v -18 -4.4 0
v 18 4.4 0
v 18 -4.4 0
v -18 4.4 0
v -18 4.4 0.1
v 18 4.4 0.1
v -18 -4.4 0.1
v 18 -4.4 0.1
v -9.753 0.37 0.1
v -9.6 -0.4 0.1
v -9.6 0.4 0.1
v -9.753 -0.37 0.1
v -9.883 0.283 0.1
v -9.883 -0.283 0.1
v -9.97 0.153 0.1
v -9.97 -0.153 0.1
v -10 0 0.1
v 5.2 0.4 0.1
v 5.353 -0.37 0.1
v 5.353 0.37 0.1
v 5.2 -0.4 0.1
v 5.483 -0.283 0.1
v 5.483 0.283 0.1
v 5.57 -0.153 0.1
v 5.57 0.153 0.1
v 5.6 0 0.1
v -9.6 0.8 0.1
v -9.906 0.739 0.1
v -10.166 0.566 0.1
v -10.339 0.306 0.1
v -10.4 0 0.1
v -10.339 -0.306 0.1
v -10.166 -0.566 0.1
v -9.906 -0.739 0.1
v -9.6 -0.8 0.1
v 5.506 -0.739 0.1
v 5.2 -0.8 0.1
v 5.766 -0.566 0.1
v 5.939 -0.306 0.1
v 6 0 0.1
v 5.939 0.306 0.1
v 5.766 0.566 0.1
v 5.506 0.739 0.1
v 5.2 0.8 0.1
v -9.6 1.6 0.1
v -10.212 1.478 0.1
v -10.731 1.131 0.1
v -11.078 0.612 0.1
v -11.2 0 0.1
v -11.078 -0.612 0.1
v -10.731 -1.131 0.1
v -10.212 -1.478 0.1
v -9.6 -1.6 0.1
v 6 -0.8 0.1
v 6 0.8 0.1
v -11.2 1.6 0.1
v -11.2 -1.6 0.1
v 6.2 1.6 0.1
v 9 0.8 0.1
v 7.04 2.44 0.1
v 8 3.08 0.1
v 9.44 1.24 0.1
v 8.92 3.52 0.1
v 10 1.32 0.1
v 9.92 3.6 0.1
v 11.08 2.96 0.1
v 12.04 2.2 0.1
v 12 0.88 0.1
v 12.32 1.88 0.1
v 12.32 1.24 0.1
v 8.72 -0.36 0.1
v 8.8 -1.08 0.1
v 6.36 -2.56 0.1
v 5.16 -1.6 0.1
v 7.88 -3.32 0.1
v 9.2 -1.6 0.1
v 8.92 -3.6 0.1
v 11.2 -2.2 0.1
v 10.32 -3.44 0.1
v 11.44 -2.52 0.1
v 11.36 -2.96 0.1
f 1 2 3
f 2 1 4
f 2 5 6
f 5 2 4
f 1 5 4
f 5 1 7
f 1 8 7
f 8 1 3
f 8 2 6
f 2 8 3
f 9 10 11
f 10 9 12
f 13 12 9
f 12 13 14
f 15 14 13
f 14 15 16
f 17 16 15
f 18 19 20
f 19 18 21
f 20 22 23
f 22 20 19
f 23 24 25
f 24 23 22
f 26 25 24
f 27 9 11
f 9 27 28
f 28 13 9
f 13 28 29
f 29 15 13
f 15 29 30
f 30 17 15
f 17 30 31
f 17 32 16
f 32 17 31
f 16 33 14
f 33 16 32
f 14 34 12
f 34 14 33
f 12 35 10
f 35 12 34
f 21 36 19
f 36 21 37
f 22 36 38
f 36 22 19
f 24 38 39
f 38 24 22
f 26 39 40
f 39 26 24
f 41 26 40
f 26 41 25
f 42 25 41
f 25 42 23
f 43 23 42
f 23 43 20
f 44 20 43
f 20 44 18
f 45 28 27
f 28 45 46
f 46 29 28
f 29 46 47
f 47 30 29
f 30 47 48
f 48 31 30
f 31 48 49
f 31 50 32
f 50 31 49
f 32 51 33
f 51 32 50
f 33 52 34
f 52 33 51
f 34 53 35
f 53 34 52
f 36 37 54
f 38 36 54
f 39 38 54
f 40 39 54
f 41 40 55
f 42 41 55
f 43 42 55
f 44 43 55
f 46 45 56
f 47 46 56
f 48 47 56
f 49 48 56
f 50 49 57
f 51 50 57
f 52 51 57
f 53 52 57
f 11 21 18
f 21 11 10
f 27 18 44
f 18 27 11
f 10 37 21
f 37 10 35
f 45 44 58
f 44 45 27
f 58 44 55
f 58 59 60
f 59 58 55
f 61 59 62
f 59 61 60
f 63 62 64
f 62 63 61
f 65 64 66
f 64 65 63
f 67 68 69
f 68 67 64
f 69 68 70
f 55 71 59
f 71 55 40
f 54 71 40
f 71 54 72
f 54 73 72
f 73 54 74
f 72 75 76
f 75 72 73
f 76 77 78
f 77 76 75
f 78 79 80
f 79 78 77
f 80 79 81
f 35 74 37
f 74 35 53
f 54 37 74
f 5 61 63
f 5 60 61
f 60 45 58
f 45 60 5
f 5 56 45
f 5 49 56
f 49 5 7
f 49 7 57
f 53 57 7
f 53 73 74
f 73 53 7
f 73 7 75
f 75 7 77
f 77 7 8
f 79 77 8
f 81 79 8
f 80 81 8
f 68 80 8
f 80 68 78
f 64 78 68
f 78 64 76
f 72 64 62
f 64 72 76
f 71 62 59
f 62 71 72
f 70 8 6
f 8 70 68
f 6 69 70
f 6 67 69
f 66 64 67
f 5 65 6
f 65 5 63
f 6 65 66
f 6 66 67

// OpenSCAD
// file: ../p/4-4edge.scad
use <../lib.scad>
$fa=1; $fs=0.2;
function ldraw_lib__4_4edge(realsolid=false) = [
// 0 Circle 1.0
// 0 Name: 4-4edge.dat
// 0 Author: James Jessiman
// 0 !LDRAW_ORG Primitive UPDATE 2017-01
// 0 !LICENSE Licensed under CC BY 2.0 and CC BY 4.0 : see CAreadme.txt
// 
// 0 BFC CERTIFY CCW
  [0,"BFC","CERTIFY"],
  [0,"BFC","CCW"],
// 
// 0 !HISTORY 1998-12-15 [PTadmin] Official Update 1998-10
// 0 !HISTORY 2005-12-28 [PTadmin] Official Update 2005-01
// 0 !HISTORY 2007-06-24 [PTadmin] Header formatted for Contributor Agreement
// 0 !HISTORY 2008-07-01 [PTadmin] Official Update 2008-01
// 0 !HISTORY 2017-01-15 [Steffen] BFCed
// 0 !HISTORY 2017-12-30 [PTadmin] Official Update 2017-01
// 
// 
// 2 24 1 0 0 0.9239 0 0.3827
  [2,24,1,0,0,0.9239,0,0.3827],
// 2 24 0.9239 0 0.3827 0.7071 0 0.7071
  [2,24,0.9239,0,0.3827,0.7071,0,0.7071],
// 2 24 0.7071 0 0.7071 0.3827 0 0.9239
  [2,24,0.7071,0,0.7071,0.3827,0,0.9239],
// 2 24 0.3827 0 0.9239 0 0 1
  [2,24,0.3827,0,0.9239,0,0,1],
// 2 24 0 0 1 -0.3827 0 0.9239
  [2,24,0,0,1,-0.3827,0,0.9239],
// 2 24 -0.3827 0 0.9239 -0.7071 0 0.7071
  [2,24,-0.3827,0,0.9239,-0.7071,0,0.7071],
// 2 24 -0.7071 0 0.7071 -0.9239 0 0.3827
  [2,24,-0.7071,0,0.7071,-0.9239,0,0.3827],
// 2 24 -0.9239 0 0.3827 -1 0 -0
  [2,24,-0.9239,0,0.3827,-1,0,-0],
// 2 24 -1 0 -0 -0.9239 0 -0.3827
  [2,24,-1,0,-0,-0.9239,0,-0.3827],
// 2 24 -0.9239 0 -0.3827 -0.7071 0 -0.7071
  [2,24,-0.9239,0,-0.3827,-0.7071,0,-0.7071],
// 2 24 -0.7071 0 -0.7071 -0.3827 0 -0.9239
  [2,24,-0.7071,0,-0.7071,-0.3827,0,-0.9239],
// 2 24 -0.3827 0 -0.9239 0 0 -1
  [2,24,-0.3827,0,-0.9239,0,0,-1],
// 2 24 0 0 -1 0.3827 0 -0.9239
  [2,24,0,0,-1,0.3827,0,-0.9239],
// 2 24 0.3827 0 -0.9239 0.7071 0 -0.7071
  [2,24,0.3827,0,-0.9239,0.7071,0,-0.7071],
// 2 24 0.7071 0 -0.7071 0.9239 0 -0.3827
  [2,24,0.7071,0,-0.7071,0.9239,0,-0.3827],
// 2 24 0.9239 0 -0.3827 1 0 0
  [2,24,0.9239,0,-0.3827,1,0,0],
];
module ldraw_lib__4_4edge(step=0, col=false, unit=2/5, alt=false, line=0.2, solid=!$preview)
    makepoly(ldraw_lib__4_4edge(solid), step=step, col=col, unit=unit, alt=alt, line=line, solid=solid);
ldraw_lib__4_4edge(line=0.2);
// file: ../p/4-4disc.scad
use <../lib.scad>
$fa=1; $fs=0.2;
function ldraw_lib__4_4disc(realsolid=false) = [
// 0 Disc 1.0
// 0 Name: 4-4disc.dat
// 0 Author: James Jessiman
// 0 !LDRAW_ORG Primitive UPDATE 2002-02
// 0 !LICENSE Licensed under CC BY 2.0 and CC BY 4.0 : see CAreadme.txt
// 
// 0 BFC CERTIFY CCW
  [0,"BFC","CERTIFY"],
  [0,"BFC","CCW"],
// 
// 0 !HISTORY 1998-12-15 [PTadmin] Official Update 1998-10
// 0 !HISTORY 2002-03-23 [sbliss] Added BFC statement
// 0 !HISTORY 2002-04-25 [PTadmin] Official Update 2002-02
// 0 !HISTORY 2007-06-24 [PTadmin] Header formatted for Contributor Agreement
// 0 !HISTORY 2008-07-01 [PTadmin] Official Update 2008-01
// 
// 
// 3 16 0 0 0 1 0 0 0.9239 0 0.3827
  [3,16,0,0,0,1,0,0,0.9239,0,0.3827],
// 3 16 0 0 0 0.9239 0 0.3827 0.7071 0 0.7071
  [3,16,0,0,0,0.9239,0,0.3827,0.7071,0,0.7071],
// 3 16 0 0 0 0.7071 0 0.7071 0.3827 0 0.9239
  [3,16,0,0,0,0.7071,0,0.7071,0.3827,0,0.9239],
// 3 16 0 0 0 0.3827 0 0.9239 0 0 1
  [3,16,0,0,0,0.3827,0,0.9239,0,0,1],
// 3 16 0 0 0 0 0 1 -0.3827 0 0.9239
  [3,16,0,0,0,0,0,1,-0.3827,0,0.9239],
// 3 16 0 0 0 -0.3827 0 0.9239 -0.7071 0 0.7071
  [3,16,0,0,0,-0.3827,0,0.9239,-0.7071,0,0.7071],
// 3 16 0 0 0 -0.7071 0 0.7071 -0.9239 0 0.3827
  [3,16,0,0,0,-0.7071,0,0.7071,-0.9239,0,0.3827],
// 3 16 0 0 0 -0.9239 0 0.3827 -1 0 -0
  [3,16,0,0,0,-0.9239,0,0.3827,-1,0,-0],
// 3 16 0 0 0 -1 0 -0 -0.9239 0 -0.3827
  [3,16,0,0,0,-1,0,-0,-0.9239,0,-0.3827],
// 3 16 0 0 0 -0.9239 0 -0.3827 -0.7071 0 -0.7071
  [3,16,0,0,0,-0.9239,0,-0.3827,-0.7071,0,-0.7071],
// 3 16 0 0 0 -0.7071 0 -0.7071 -0.3827 0 -0.9239
  [3,16,0,0,0,-0.7071,0,-0.7071,-0.3827,0,-0.9239],
// 3 16 0 0 0 -0.3827 0 -0.9239 0 0 -1
  [3,16,0,0,0,-0.3827,0,-0.9239,0,0,-1],
// 3 16 0 0 0 0 0 -1 0.3827 0 -0.9239
  [3,16,0,0,0,0,0,-1,0.3827,0,-0.9239],
// 3 16 0 0 0 0.3827 0 -0.9239 0.7071 0 -0.7071
  [3,16,0,0,0,0.3827,0,-0.9239,0.7071,0,-0.7071],
// 3 16 0 0 0 0.7071 0 -0.7071 0.9239 0 -0.3827
  [3,16,0,0,0,0.7071,0,-0.7071,0.9239,0,-0.3827],
// 3 16 0 0 0 0.9239 0 -0.3827 1 0 0
  [3,16,0,0,0,0.9239,0,-0.3827,1,0,0],
// 0
];
module ldraw_lib__4_4disc(step=0, col=false, unit=2/5, alt=false, line=0.2, solid=!$preview)
    makepoly(ldraw_lib__4_4disc(solid), step=step, col=col, unit=unit, alt=alt, line=line, solid=solid);
ldraw_lib__4_4disc(line=0.2);
// file: ../p/4-4cyli.scad
use <../lib.scad>
$fa=1; $fs=0.2;
function ldraw_lib__4_4cyli(realsolid=false) = [
// 0 Cylinder 1.0
// 0 Name: 4-4cyli.dat
// 0 Author: James Jessiman
// 0 !LDRAW_ORG Primitive UPDATE 2005-01
// 0 !LICENSE Licensed under CC BY 2.0 and CC BY 4.0 : see CAreadme.txt
// 
// 0 BFC CERTIFY CCW
  [0,"BFC","CERTIFY"],
  [0,"BFC","CCW"],
// 
// 0 !HISTORY 1998-12-15 [PTadmin] Official Update 1998-10
// 0 !HISTORY 2002-03-23 [sbliss] Added BFC statement; merged headers from files in distributions LDraw 0.27 and Complete.
// 0 !HISTORY 2002-04-25 [PTadmin] Official Update 2002-02
// 0 !HISTORY 2004-12-14 [guyvivan] BFC CCW
// 0 !HISTORY 2005-12-28 [PTadmin] Official Update 2005-01
// 0 !HISTORY 2007-06-24 [PTadmin] Header formatted for Contributor Agreement
// 0 !HISTORY 2008-07-01 [PTadmin] Official Update 2008-01
// 
// 
// 4 16 1 1 0 0.9239 1 0.3827 0.9239 0 0.3827 1 0 0
  [4,16,1,1,0,0.9239,1,0.3827,0.9239,0,0.3827,1,0,0],
// 5 24 1 0 0 1 1 0 0.9239 0 0.3827 0.9239 0 -0.3827
  [5,24,1,0,0,1,1,0,0.9239,0,0.3827,0.9239,0,-0.3827],
// 4 16 0.9239 1 0.3827 0.7071 1 0.7071 0.7071 0 0.7071 0.9239 0 0.3827
  [4,16,0.9239,1,0.3827,0.7071,1,0.7071,0.7071,0,0.7071,0.9239,0,0.3827],
// 5 24 0.9239 0 0.3827 0.9239 1 0.3827 0.7071 0 0.7071 1 0 0
  [5,24,0.9239,0,0.3827,0.9239,1,0.3827,0.7071,0,0.7071,1,0,0],
// 4 16 0.7071 1 0.7071 0.3827 1 0.9239 0.3827 0 0.9239 0.7071 0 0.7071
  [4,16,0.7071,1,0.7071,0.3827,1,0.9239,0.3827,0,0.9239,0.7071,0,0.7071],
// 5 24 0.7071 0 0.7071 0.7071 1 0.7071 0.3827 0 0.9239 0.9239 0 0.3827
  [5,24,0.7071,0,0.7071,0.7071,1,0.7071,0.3827,0,0.9239,0.9239,0,0.3827],
// 4 16 0.3827 1 0.9239 0 1 1 0 0 1 0.3827 0 0.9239
  [4,16,0.3827,1,0.9239,0,1,1,0,0,1,0.3827,0,0.9239],
// 5 24 0.3827 0 0.9239 0.3827 1 0.9239 0 0 1 0.7071 0 0.7071
  [5,24,0.3827,0,0.9239,0.3827,1,0.9239,0,0,1,0.7071,0,0.7071],
// 4 16 0 1 1 -0.3827 1 0.9239 -0.3827 0 0.9239 0 0 1
  [4,16,0,1,1,-0.3827,1,0.9239,-0.3827,0,0.9239,0,0,1],
// 5 24 0 0 1 0 1 1 -0.3827 0 0.9239 0.3827 0 0.9239
  [5,24,0,0,1,0,1,1,-0.3827,0,0.9239,0.3827,0,0.9239],
// 4 16 -0.3827 1 0.9239 -0.7071 1 0.7071 -0.7071 0 0.7071 -0.3827 0 0.9239
  [4,16,-0.3827,1,0.9239,-0.7071,1,0.7071,-0.7071,0,0.7071,-0.3827,0,0.9239],
// 5 24 -0.3827 0 0.9239 -0.3827 1 0.9239 -0.7071 0 0.7071 0 0 1
  [5,24,-0.3827,0,0.9239,-0.3827,1,0.9239,-0.7071,0,0.7071,0,0,1],
// 4 16 -0.7071 1 0.7071 -0.9239 1 0.3827 -0.9239 0 0.3827 -0.7071 0 0.7071
  [4,16,-0.7071,1,0.7071,-0.9239,1,0.3827,-0.9239,0,0.3827,-0.7071,0,0.7071],
// 5 24 -0.7071 0 0.7071 -0.7071 1 0.7071 -0.9239 0 0.3827 -0.3827 0 0.9239
  [5,24,-0.7071,0,0.7071,-0.7071,1,0.7071,-0.9239,0,0.3827,-0.3827,0,0.9239],
// 4 16 -0.9239 1 0.3827 -1 1 0 -1 0 0 -0.9239 0 0.3827
  [4,16,-0.9239,1,0.3827,-1,1,0,-1,0,0,-0.9239,0,0.3827],
// 5 24 -0.9239 0 0.3827 -0.9239 1 0.3827 -1 0 0 -0.7071 0 0.7071
  [5,24,-0.9239,0,0.3827,-0.9239,1,0.3827,-1,0,0,-0.7071,0,0.7071],
// 4 16 -1 1 0 -0.9239 1 -0.3827 -0.9239 0 -0.3827 -1 0 0
  [4,16,-1,1,0,-0.9239,1,-0.3827,-0.9239,0,-0.3827,-1,0,0],
// 5 24 -1 0 0 -1 1 0 -0.9239 0 -0.3827 -0.9239 0 0.3827
  [5,24,-1,0,0,-1,1,0,-0.9239,0,-0.3827,-0.9239,0,0.3827],
// 4 16 -0.9239 1 -0.3827 -0.7071 1 -0.7071 -0.7071 0 -0.7071 -0.9239 0 -0.3827
  [4,16,-0.9239,1,-0.3827,-0.7071,1,-0.7071,-0.7071,0,-0.7071,-0.9239,0,-0.3827],
// 5 24 -0.9239 0 -0.3827 -0.9239 1 -0.3827 -0.7071 0 -0.7071 -1 0 0
  [5,24,-0.9239,0,-0.3827,-0.9239,1,-0.3827,-0.7071,0,-0.7071,-1,0,0],
// 4 16 -0.7071 1 -0.7071 -0.3827 1 -0.9239 -0.3827 0 -0.9239 -0.7071 0 -0.7071
  [4,16,-0.7071,1,-0.7071,-0.3827,1,-0.9239,-0.3827,0,-0.9239,-0.7071,0,-0.7071],
// 5 24 -0.7071 0 -0.7071 -0.7071 1 -0.7071 -0.3827 0 -0.9239 -0.9239 0 -0.3827
  [5,24,-0.7071,0,-0.7071,-0.7071,1,-0.7071,-0.3827,0,-0.9239,-0.9239,0,-0.3827],
// 4 16 -0.3827 1 -0.9239 0 1 -1 0 0 -1 -0.3827 0 -0.9239
  [4,16,-0.3827,1,-0.9239,0,1,-1,0,0,-1,-0.3827,0,-0.9239],
// 5 24 -0.3827 0 -0.9239 -0.3827 1 -0.9239 0 0 -1 -0.7071 0 -0.7071
  [5,24,-0.3827,0,-0.9239,-0.3827,1,-0.9239,0,0,-1,-0.7071,0,-0.7071],
// 4 16 0 1 -1 0.3827 1 -0.9239 0.3827 0 -0.9239 0 0 -1
  [4,16,0,1,-1,0.3827,1,-0.9239,0.3827,0,-0.9239,0,0,-1],
// 5 24 0 0 -1 0 1 -1 0.3827 0 -0.9239 -0.3827 0 -0.9239
  [5,24,0,0,-1,0,1,-1,0.3827,0,-0.9239,-0.3827,0,-0.9239],
// 4 16 0.3827 1 -0.9239 0.7071 1 -0.7071 0.7071 0 -0.7071 0.3827 0 -0.9239
  [4,16,0.3827,1,-0.9239,0.7071,1,-0.7071,0.7071,0,-0.7071,0.3827,0,-0.9239],
// 5 24 0.3827 0 -0.9239 0.3827 1 -0.9239 0.7071 0 -0.7071 0 0 -1
  [5,24,0.3827,0,-0.9239,0.3827,1,-0.9239,0.7071,0,-0.7071,0,0,-1],
// 4 16 0.7071 1 -0.7071 0.9239 1 -0.3827 0.9239 0 -0.3827 0.7071 0 -0.7071
  [4,16,0.7071,1,-0.7071,0.9239,1,-0.3827,0.9239,0,-0.3827,0.7071,0,-0.7071],
// 5 24 0.7071 0 -0.7071 0.7071 1 -0.7071 0.9239 0 -0.3827 0.3827 0 -0.9239
  [5,24,0.7071,0,-0.7071,0.7071,1,-0.7071,0.9239,0,-0.3827,0.3827,0,-0.9239],
// 4 16 0.9239 1 -0.3827 1 1 0 1 0 0 0.9239 0 -0.3827
  [4,16,0.9239,1,-0.3827,1,1,0,1,0,0,0.9239,0,-0.3827],
// 5 24 0.9239 0 -0.3827 0.9239 1 -0.3827 1 0 0 0.7071 0 -0.7071
  [5,24,0.9239,0,-0.3827,0.9239,1,-0.3827,1,0,0,0.7071,0,-0.7071],
// 0
];
module ldraw_lib__4_4cyli(step=0, col=false, unit=2/5, alt=false, line=0.2, solid=!$preview)
    makepoly(ldraw_lib__4_4cyli(solid), step=step, col=col, unit=unit, alt=alt, line=line, solid=solid);
ldraw_lib__4_4cyli(line=0.2);
// file: ../p/stud3.scad
use <../lib.scad>
use <4-4cyli.scad>
use <4-4disc.scad>
use <4-4edge.scad>
$fa=1; $fs=0.2;
function ldraw_lib__stud3(realsolid=false) = realsolid ? 
    [openscad(translate([0,0,-eps()], o=cylinder(4+eps(), r=4)),2)] : [
// 0 Stud Tube Solid
// 0 Name: stud3.dat
// 0 Author: James Jessiman
// 0 !LDRAW_ORG Primitive UPDATE 2012-01
// 0 !LICENSE Licensed under CC BY 2.0 and CC BY 4.0 : see CAreadme.txt
// 
// 0 BFC CERTIFY CCW
  [0,"BFC","CERTIFY"],
  [0,"BFC","CCW"],
// 
// 0 !HISTORY 2002-04-04 [sbliss] Modified for BFC compliance
// 0 !HISTORY 2002-04-25 [PTadmin] Official Update 2002-02
// 0 !HISTORY 2007-06-24 [PTadmin] Header formatted for Contributor Agreement
// 0 !HISTORY 2008-07-01 [PTadmin] Official Update 2008-01
// 0 !HISTORY 2012-02-16 [Philo] Changed to CCW
// 0 !HISTORY 2012-03-30 [PTadmin] Official Update 2012-01
// 
// 
// 1 16 0 -4 0 4 0 0 0 1 0 0 0 4 4-4edge.dat
  [1,16,0,-4,0,4,0,0,0,1,0,0,0,4, ldraw_lib__4_4edge(realsolid)],
// 1 16 0 0 0 4 0 0 0 1 0 0 0 4 4-4edge.dat
  [1,16,0,0,0,4,0,0,0,1,0,0,0,4, ldraw_lib__4_4edge(realsolid)],
// 1 16 0 -4 0 4 0 0 0 1 0 0 0 4 4-4disc.dat
  [1,16,0,-4,0,4,0,0,0,1,0,0,0,4, ldraw_lib__4_4disc(realsolid)],
// 1 16 0 -4 0 4 0 0 0 4 0 0 0 4 4-4cyli.dat
  [1,16,0,-4,0,4,0,0,0,4,0,0,0,4, ldraw_lib__4_4cyli(realsolid)],
];
module ldraw_lib__stud3(step=0, col=false, unit=2/5, alt=false, line=0.2, solid=!$preview)
    makepoly(ldraw_lib__stud3(solid), step=step, col=col, unit=unit, alt=alt, line=line, solid=solid);
ldraw_lib__stud3(line=0.2);
// file: ../p/stud.scad
use <../lib.scad>
use <4-4cyli.scad>
use <4-4disc.scad>
use <4-4edge.scad>
$fa=1; $fs=0.2;
function ldraw_lib__stud(realsolid=false) = realsolid ? 
    [openscad(translate([0,0,-eps()], o=cylinder(4+eps(), r=6)),2)] : [
// 0 Stud
// 0 Name: stud.dat
// 0 Author: James Jessiman
// 0 !LDRAW_ORG Primitive UPDATE 2012-01
// 0 !LICENSE Licensed under CC BY 2.0 and CC BY 4.0 : see CAreadme.txt
// 
// 0 BFC CERTIFY CCW
  [0,"BFC","CERTIFY"],
  [0,"BFC","CCW"],
// 
// 0 !HISTORY 2002-04-04 [sbliss] Modified for BFC compliance
// 0 !HISTORY 2002-04-25 [PTadmin] Official Update 2002-02
// 0 !HISTORY 2007-06-24 [PTadmin] Header formatted for Contributor Agreement
// 0 !HISTORY 2008-07-01 [PTadmin] Official Update 2008-01
// 0 !HISTORY 2012-02-16 [Philo] Changed to CCW
// 0 !HISTORY 2012-03-30 [PTadmin] Official Update 2012-01
// 
// 
// 1 16 0 0 0 6 0 0 0 1 0 0 0 6 4-4edge.dat
  [1,16,0,0,0,6,0,0,0,1,0,0,0,6, ldraw_lib__4_4edge(realsolid)],
// 1 16 0 -4 0 6 0 0 0 1 0 0 0 6 4-4edge.dat
  [1,16,0,-4,0,6,0,0,0,1,0,0,0,6, ldraw_lib__4_4edge(realsolid)],
// 1 16 0 0 0 6 0 0 0 -4 0 0 0 6 4-4cyli.dat
  [1,16,0,0,0,6,0,0,0,-4,0,0,0,6, ldraw_lib__4_4cyli(realsolid)],
// 1 16 0 -4 0 6 0 0 0 1 0 0 0 6 4-4disc.dat
  [1,16,0,-4,0,6,0,0,0,1,0,0,0,6, ldraw_lib__4_4disc(realsolid)],
];
module ldraw_lib__stud(step=0, col=false, unit=2/5, alt=false, line=0.2, solid=!$preview)
    makepoly(ldraw_lib__stud(solid), step=step, col=col, unit=unit, alt=alt, line=line, solid=solid);
ldraw_lib__stud(line=0.2);
// file: ../p/box5.scad
use <../lib.scad>
$fa=1; $fs=0.2;
function ldraw_lib__box5(realsolid=false) = [
// 0 Box with 5 Faces and All Edges
// 0 Name: box5.dat
// 0 Author: James Jessiman
// 0 !LDRAW_ORG Primitive UPDATE 2012-01
// 0 !LICENSE Licensed under CC BY 2.0 and CC BY 4.0 : see CAreadme.txt
// 
// 0 BFC CERTIFY CCW
  [0,"BFC","CERTIFY"],
  [0,"BFC","CCW"],
// 
// 0 !HISTORY 2002-04-03 [sbliss] Modified for BFC compliance
// 0 !HISTORY 2002-04-25 [PTadmin] Official Update 2002-02
// 0 !HISTORY 2007-06-24 [PTadmin] Header formatted for Contributor Agreement
// 0 !HISTORY 2008-07-01 [PTadmin] Official Update 2008-01
// 0 !HISTORY 2012-02-16 [Philo] Changed to CCW
// 0 !HISTORY 2012-03-30 [PTadmin] Official Update 2012-01
// 
// 
// 2 24 1 1 1 -1 1 1
  [2,24,1,1,1,-1,1,1],
// 2 24 -1 1 1 -1 1 -1
  [2,24,-1,1,1,-1,1,-1],
// 2 24 -1 1 -1 1 1 -1
  [2,24,-1,1,-1,1,1,-1],
// 2 24 1 1 -1 1 1 1
  [2,24,1,1,-1,1,1,1],
// 2 24 1 0 1 -1 0 1
  [2,24,1,0,1,-1,0,1],
// 2 24 -1 0 1 -1 0 -1
  [2,24,-1,0,1,-1,0,-1],
// 2 24 -1 0 -1 1 0 -1
  [2,24,-1,0,-1,1,0,-1],
// 2 24 1 0 -1 1 0 1
  [2,24,1,0,-1,1,0,1],
// 2 24 1 0 1 1 1 1
  [2,24,1,0,1,1,1,1],
// 2 24 -1 0 1 -1 1 1
  [2,24,-1,0,1,-1,1,1],
// 2 24 1 0 -1 1 1 -1
  [2,24,1,0,-1,1,1,-1],
// 2 24 -1 0 -1 -1 1 -1
  [2,24,-1,0,-1,-1,1,-1],
// 4 16 -1 1 1 1 1 1 1 1 -1 -1 1 -1
  [4,16,-1,1,1,1,1,1,1,1,-1,-1,1,-1],
// 4 16 -1 1 1 -1 0 1 1 0 1 1 1 1
  [4,16,-1,1,1,-1,0,1,1,0,1,1,1,1],
// 4 16 -1 1 -1 -1 0 -1 -1 0 1 -1 1 1
  [4,16,-1,1,-1,-1,0,-1,-1,0,1,-1,1,1],
// 4 16 1 1 -1 1 0 -1 -1 0 -1 -1 1 -1
  [4,16,1,1,-1,1,0,-1,-1,0,-1,-1,1,-1],
// 4 16 1 1 1 1 0 1 1 0 -1 1 1 -1
  [4,16,1,1,1,1,0,1,1,0,-1,1,1,-1],
];
module ldraw_lib__box5(step=0, col=false, unit=2/5, alt=false, line=0.2, solid=!$preview)
    makepoly(ldraw_lib__box5(solid), step=step, col=col, unit=unit, alt=alt, line=line, solid=solid);
ldraw_lib__box5(line=0.2);
// file: ../p/box4t.scad
use <../lib.scad>
$fa=1; $fs=0.2;
function ldraw_lib__box4t(realsolid=false) = [
// 0 Box with 4 Adjacent Faces and All Edges
// 0 Name: box4t.dat
// 0 Author: Tore Eriksson [Tore_Eriksson]
// 0 !LDRAW_ORG Primitive UPDATE 2003-02
// 0 !LICENSE Licensed under CC BY 2.0 and CC BY 4.0 : see CAreadme.txt
// 
// 0 BFC CERTIFY CCW
  [0,"BFC","CERTIFY"],
  [0,"BFC","CCW"],
// 
// 0 !HISTORY 1997-09-29 [PTadmin] Official Update 1997-15
// 0 !HISTORY 2002-08-31 [izanette] Modified with WINDZ for BFC compliance
// 0 !HISTORY 2003-08-01 [PTadmin] Official Update 2003-02
// 0 !HISTORY 2007-06-24 [PTadmin] Header formatted for Contributor Agreement
// 0 !HISTORY 2008-07-01 [PTadmin] Official Update 2008-01
// 
// 
// 2 24 1 1 1 -1 1 1
  [2,24,1,1,1,-1,1,1],
// 2 24 -1 1 1 -1 1 -1
  [2,24,-1,1,1,-1,1,-1],
// 2 24 -1 1 -1 1 1 -1
  [2,24,-1,1,-1,1,1,-1],
// 2 24 1 1 -1 1 1 1
  [2,24,1,1,-1,1,1,1],
// 2 24 1 0 1 -1 0 1
  [2,24,1,0,1,-1,0,1],
// 2 24 -1 0 1 -1 0 -1
  [2,24,-1,0,1,-1,0,-1],
// 2 24 -1 0 -1 1 0 -1
  [2,24,-1,0,-1,1,0,-1],
// 2 24 1 0 -1 1 0 1
  [2,24,1,0,-1,1,0,1],
// 2 24 1 0 1 1 1 1
  [2,24,1,0,1,1,1,1],
// 2 24 -1 0 1 -1 1 1
  [2,24,-1,0,1,-1,1,1],
// 2 24 1 0 -1 1 1 -1
  [2,24,1,0,-1,1,1,-1],
// 2 24 -1 0 -1 -1 1 -1
  [2,24,-1,0,-1,-1,1,-1],
// 4 16 1 1 1 1 1 -1 -1 1 -1 -1 1 1
  [4,16,1,1,1,1,1,-1,-1,1,-1,-1,1,1],
// 4 16 1 1 1 -1 1 1 -1 0 1 1 0 1
  [4,16,1,1,1,-1,1,1,-1,0,1,1,0,1],
// 4 16 -1 1 1 -1 1 -1 -1 0 -1 -1 0 1
  [4,16,-1,1,1,-1,1,-1,-1,0,-1,-1,0,1],
// 0 4 16 -1 1 -1 -1 0 -1 1 0 -1 1 1 -1
// 4 16 1 1 -1 1 1 1 1 0 1 1 0 -1
  [4,16,1,1,-1,1,1,1,1,0,1,1,0,-1],
// 0
];
module ldraw_lib__box4t(step=0, col=false, unit=2/5, alt=false, line=0.2, solid=!$preview)
    makepoly(ldraw_lib__box4t(solid), step=step, col=col, unit=unit, alt=alt, line=line, solid=solid);
ldraw_lib__box4t(line=0.2);
// file: s/3004s01.scad
use <../../lib.scad>
use <../../p/box4t.scad>
use <../../p/box5.scad>
use <../../p/stud.scad>
use <../../p/stud3.scad>
$fa=1; $fs=0.2;
function ldraw_lib__s__3004s01(realsolid=false) = [
// 0 ~Brick  1 x  2 without Front Face
// 0 Name: s\3004s01.dat
// 0 Author: James Jessiman
// 0 !LDRAW_ORG Subpart UPDATE 2003-03
// 0 !LICENSE Licensed under CC BY 2.0 and CC BY 4.0 : see CAreadme.txt
// 
// 0 BFC CERTIFY CCW
  [0,"BFC","CERTIFY"],
  [0,"BFC","CCW"],
// 
// 0 !HISTORY 2003-09-07 [jriley] Subfiling, BFC
// 0 !HISTORY 2003-12-19 [PTadmin] Official Update 2003-03
// 0 !HISTORY 2007-08-29 [PTadmin] Header formatted for Contributor Agreement
// 0 !HISTORY 2008-07-01 [PTadmin] Official Update 2008-01
// 
// 
// 1 16 0 4 0 1 0 0 0 -5 0 0 0 1 stud3.dat
  [1,16,0,4,0,1,0,0,0,-5,0,0,0,1, ldraw_lib__stud3(realsolid)],
// 0 BFC INVERTNEXT
  [0,"BFC","INVERTNEXT"],
// 1 16 0 24 0 16 0 0 0 -20 0 0 0 6 box5.dat
  [1,16,0,24,0,16,0,0,0,-20,0,0,0,6, ldraw_lib__box5(realsolid)],
// 4 16 20 24 10 16 24 6 -16 24 6 -20 24 10
  [4,16,20,24,10,16,24,6,-16,24,6,-20,24,10],
// 4 16 -20 24 10 -16 24 6 -16 24 -6 -20 24 -10
  [4,16,-20,24,10,-16,24,6,-16,24,-6,-20,24,-10],
// 4 16 -20 24 -10 -16 24 -6 16 24 -6 20 24 -10
  [4,16,-20,24,-10,-16,24,-6,16,24,-6,20,24,-10],
// 4 16 20 24 -10 16 24 -6 16 24 6 20 24 10
  [4,16,20,24,-10,16,24,-6,16,24,6,20,24,10],
// 1 16 0 24 0 20 0 0 0 -24 0 0 0 10 box4t.dat
  [1,16,0,24,0,20,0,0,0,-24,0,0,0,10, ldraw_lib__box4t(realsolid)],
// 1 16 10 0 0 1 0 0 0 1 0 0 0 1 stud.dat
  [1,16,10,0,0,1,0,0,0,1,0,0,0,1, ldraw_lib__stud(realsolid)],
// 1 16 -10 0 0 1 0 0 0 1 0 0 0 1 stud.dat
  [1,16,-10,0,0,1,0,0,0,1,0,0,0,1, ldraw_lib__stud(realsolid)],
// 0
];
module ldraw_lib__s__3004s01(step=0, col=false, unit=2/5, alt=false, line=0.2, solid=!$preview)
    makepoly(ldraw_lib__s__3004s01(solid), step=step, col=col, unit=unit, alt=alt, line=line, solid=solid);
ldraw_lib__s__3004s01(line=0.2);
// file: 3004.scad
use <../lib.scad>
use <s/3004s01.scad>
$fa=1; $fs=0.2;
function ldraw_lib__3004(realsolid=false) = [
// 0 Brick  1 x  2
// 0 Name: 3004.dat
// 0 Author: James Jessiman
// 0 !LDRAW_ORG Part UPDATE 2022-05
// 0 !LICENSE Licensed under CC BY 2.0 and CC BY 4.0 : see CAreadme.txt
// 
// 0 BFC CERTIFY CCW
  [0,"BFC","CERTIFY"],
  [0,"BFC","CCW"],
// 
// 0 !HISTORY 2001-10-26 [PTadmin] Official Update 2001-01
// 0 !HISTORY 2002-05-07 {unknown} BFC Certification
// 0 !HISTORY 2002-06-11 [PTadmin] Official Update 2002-03
// 0 !HISTORY 2007-05-07 [PTadmin] Header formatted for Contributor Agreement
// 0 !HISTORY 2008-07-01 [PTadmin] Official Update 2008-01
// 0 !HISTORY 2022-08-04 [MagFors] Using subfile
// 0 !HISTORY 2022-09-15 [PTadmin] Official Update 2022-05
// 
// 
// 1 16 0 0 0 1 0 0 0 1 0 0 0 1 s\3004s01.dat
  [1,16,0,0,0,1,0,0,0,1,0,0,0,1, ldraw_lib__s__3004s01(realsolid)],
// 4 16 -20 24 -10 20 24 -10 20 0 -10 -20 0 -10
  [4,16,-20,24,-10,20,24,-10,20,0,-10,-20,0,-10],
];
module ldraw_lib__3004(step=0, col=false, unit=2/5, alt=false, line=0.2, solid=!$preview)
    makepoly(ldraw_lib__3004(solid), step=step, col=col, unit=unit, alt=alt, line=line, solid=solid);
ldraw_lib__3004(line=0.2);
// file: ../p/box5-12.scad
use <../lib.scad>
$fa=1; $fs=0.2;
function ldraw_lib__box5_12(realsolid=false) = [
// 0 Box with 5 Faces without Any Edges
// 0 Name: box5-12.dat
// 0 Author: Chris Dee [cwdee]
// 0 !LDRAW_ORG Primitive UPDATE 2009-02
// 0 !LICENSE Licensed under CC BY 2.0 and CC BY 4.0 : see CAreadme.txt
// 
// 0 BFC CERTIFY CCW
  [0,"BFC","CERTIFY"],
  [0,"BFC","CCW"],
// 
// 0 !HISTORY 2009-09-03 [PTadmin] Official Update 2009-02
// 
// 
// 4 16 1 1 1 1 1 -1 -1 1 -1 -1 1 1
  [4,16,1,1,1,1,1,-1,-1,1,-1,-1,1,1],
// 4 16 -1 0 1 1 0 1 1 1 1 -1 1 1
  [4,16,-1,0,1,1,0,1,1,1,1,-1,1,1],
// 4 16 -1 0 -1 -1 0 1 -1 1 1 -1 1 -1
  [4,16,-1,0,-1,-1,0,1,-1,1,1,-1,1,-1],
// 4 16 1 0 -1 -1 0 -1 -1 1 -1 1 1 -1
  [4,16,1,0,-1,-1,0,-1,-1,1,-1,1,1,-1],
// 4 16 1 0 1 1 0 -1 1 1 -1 1 1 1
  [4,16,1,0,1,1,0,-1,1,1,-1,1,1,1],
// 0
];
module ldraw_lib__box5_12(step=0, col=false, unit=2/5, alt=false, line=0.2, solid=!$preview)
    makepoly(ldraw_lib__box5_12(solid), step=step, col=col, unit=unit, alt=alt, line=line, solid=solid);
ldraw_lib__box5_12(line=0.2);
// file: ../p/2-4ring1.scad
use <../lib.scad>
$fa=1; $fs=0.2;
function ldraw_lib__2_4ring1(realsolid=false) = [
// 0 Ring  1 x 0.5
// 0 Name: 2-4ring1.dat
// 0 Author: Chris Dee [cwdee]
// 0 !LDRAW_ORG Primitive UPDATE 2003-02
// 0 !LICENSE Licensed under CC BY 2.0 and CC BY 4.0 : see CAreadme.txt
// 
// 0 BFC CERTIFY CCW
  [0,"BFC","CERTIFY"],
  [0,"BFC","CCW"],
// 
// 0 !HISTORY 2000-09-30 [PTadmin] Official Update 2000-02
// 0 !HISTORY 2002-08-31 [izanette] Modified with WINDZ for BFC compliance
// 0 !HISTORY 2003-08-01 [PTadmin] Official Update 2003-02
// 0 !HISTORY 2007-06-24 [PTadmin] Header formatted for Contributor Agreement
// 0 !HISTORY 2008-07-01 [PTadmin] Official Update 2008-01
// 
// 
// 4 16 2 0 0 1.8478 0 0.7654 0.9239 0 0.3827 1 0 0
  [4,16,2,0,0,1.8478,0,0.7654,0.9239,0,0.3827,1,0,0],
// 4 16 1.8478 0 0.7654 1.4142 0 1.4142 0.7071 0 0.7071 0.9239 0 0.3827
  [4,16,1.8478,0,0.7654,1.4142,0,1.4142,0.7071,0,0.7071,0.9239,0,0.3827],
// 4 16 1.4142 0 1.4142 0.7654 0 1.8478 0.3827 0 0.9239 0.7071 0 0.7071
  [4,16,1.4142,0,1.4142,0.7654,0,1.8478,0.3827,0,0.9239,0.7071,0,0.7071],
// 4 16 0.7654 0 1.8478 0 0 2 0 0 1 0.3827 0 0.9239
  [4,16,0.7654,0,1.8478,0,0,2,0,0,1,0.3827,0,0.9239],
// 4 16 0 0 2 -0.7654 0 1.8478 -0.3827 0 0.9239 0 0 1
  [4,16,0,0,2,-0.7654,0,1.8478,-0.3827,0,0.9239,0,0,1],
// 4 16 -0.7654 0 1.8478 -1.4142 0 1.4142 -0.7071 0 0.7071 -0.3827 0 0.9239
  [4,16,-0.7654,0,1.8478,-1.4142,0,1.4142,-0.7071,0,0.7071,-0.3827,0,0.9239],
// 4 16 -1.4142 0 1.4142 -1.8478 0 0.7654 -0.9239 0 0.3827 -0.7071 0 0.7071
  [4,16,-1.4142,0,1.4142,-1.8478,0,0.7654,-0.9239,0,0.3827,-0.7071,0,0.7071],
// 4 16 -1.8478 0 0.7654 -2 0 0 -1 0 0 -0.9239 0 0.3827
  [4,16,-1.8478,0,0.7654,-2,0,0,-1,0,0,-0.9239,0,0.3827],
// 0
// 
];
module ldraw_lib__2_4ring1(step=0, col=false, unit=2/5, alt=false, line=0.2, solid=!$preview)
    makepoly(ldraw_lib__2_4ring1(solid), step=step, col=col, unit=unit, alt=alt, line=line, solid=solid);
ldraw_lib__2_4ring1(line=0.2);
// file: ../p/2-4ndis.scad
use <../lib.scad>
$fa=1; $fs=0.2;
function ldraw_lib__2_4ndis(realsolid=false) = [
// 0 Disc Negative 0.5
// 0 Name: 2-4ndis.dat
// 0 Author: James Jessiman
// 0 !LDRAW_ORG Primitive UPDATE 2012-01
// 0 !LICENSE Licensed under CC BY 2.0 and CC BY 4.0 : see CAreadme.txt
// 
// 0 BFC CERTIFY CCW
  [0,"BFC","CERTIFY"],
  [0,"BFC","CCW"],
// 
// 0 !HISTORY 2002-03-23 [sbliss] Added BFC statement; compacted code
// 0 !HISTORY 2002-04-25 [PTadmin] Official Update 2002-02
// 0 !HISTORY 2007-06-24 [PTadmin] Header formatted for Contributor Agreement
// 0 !HISTORY 2008-07-01 [PTadmin] Official Update 2008-01
// 0 !HISTORY 2012-02-16 [Philo] Changed to CCW
// 0 !HISTORY 2012-03-30 [PTadmin] Official Update 2012-01
// 
// 
// 3 16 0.9239 0 0.3827 1 0 0 1 0 1
  [3,16,0.9239,0,0.3827,1,0,0,1,0,1],
// 3 16 0.7071 0 0.7071 0.9239 0 0.3827 1 0 1
  [3,16,0.7071,0,0.7071,0.9239,0,0.3827,1,0,1],
// 3 16 0.3827 0 0.9239 0.7071 0 0.7071 1 0 1
  [3,16,0.3827,0,0.9239,0.7071,0,0.7071,1,0,1],
// 3 16 0 0 1 0.3827 0 0.9239 1 0 1
  [3,16,0,0,1,0.3827,0,0.9239,1,0,1],
// 3 16 -0.3827 0 0.9239 0 0 1 -1 0 1
  [3,16,-0.3827,0,0.9239,0,0,1,-1,0,1],
// 3 16 -0.7071 0 0.7071 -0.3827 0 0.9239 -1 0 1
  [3,16,-0.7071,0,0.7071,-0.3827,0,0.9239,-1,0,1],
// 3 16 -0.9239 0 0.3827 -0.7071 0 0.7071 -1 0 1
  [3,16,-0.9239,0,0.3827,-0.7071,0,0.7071,-1,0,1],
// 3 16 -1 0 0 -0.9239 0 0.3827 -1 0 1
  [3,16,-1,0,0,-0.9239,0,0.3827,-1,0,1],
];
module ldraw_lib__2_4ndis(step=0, col=false, unit=2/5, alt=false, line=0.2, solid=!$preview)
    makepoly(ldraw_lib__2_4ndis(solid), step=step, col=col, unit=unit, alt=alt, line=line, solid=solid);
ldraw_lib__2_4ndis(line=0.2);
// file: ../p/2-4chrd.scad
use <../lib.scad>
$fa=1; $fs=0.2;
function ldraw_lib__2_4chrd(realsolid=false) = [
// 0 Chord 0.5
// 0 Name: 2-4chrd.dat
// 0 Author: Philippe Hurbain [Philo]
// 0 !LDRAW_ORG Primitive UPDATE 2014-01
// 0 !LICENSE Licensed under CC BY 2.0 and CC BY 4.0 : see CAreadme.txt
// 
// 0 BFC CERTIFY CCW
  [0,"BFC","CERTIFY"],
  [0,"BFC","CCW"],
// 
// 0 !HISTORY 2014-06-21 [PTadmin] Official Update 2014-01
// 
// 
// 4 16 0.9239 0 0.3827 -0.9239 0 0.3827 -1 0 0 1 0 0
  [4,16,0.9239,0,0.3827,-0.9239,0,0.3827,-1,0,0,1,0,0],
// 4 16 0.7071 0 0.7071 -0.7071 0 0.7071 -0.9239 0 0.3827 0.9239 0 0.3827
  [4,16,0.7071,0,0.7071,-0.7071,0,0.7071,-0.9239,0,0.3827,0.9239,0,0.3827],
// 4 16 0.3827 0 0.9239 -0.3827 0 0.9239 -0.7071 0 0.7071 0.7071 0 0.7071
  [4,16,0.3827,0,0.9239,-0.3827,0,0.9239,-0.7071,0,0.7071,0.7071,0,0.7071],
// 3 16 0 0 1 -0.3827 0 0.9239 0.3827 0 0.9239
  [3,16,0,0,1,-0.3827,0,0.9239,0.3827,0,0.9239],
];
module ldraw_lib__2_4chrd(step=0, col=false, unit=2/5, alt=false, line=0.2, solid=!$preview)
    makepoly(ldraw_lib__2_4chrd(solid), step=step, col=col, unit=unit, alt=alt, line=line, solid=solid);
ldraw_lib__2_4chrd(line=0.2);
// main file
use <../lib.scad>
use <../p/2-4chrd.scad>
use <../p/2-4ndis.scad>
use <../p/2-4ring1.scad>
use <../p/box5-12.scad>
$fa=1; $fs=0.2;
function ldraw_lib__191815b(realsolid=false) = [
// 0 Sticker  1.1 x  4.5 with Black Wrench on Yellow Background
// 0 Name: 191815b.dat
// 0 Author: Takeshi Takahashi [RainbowDolphin]
// 0 !LDRAW_ORG Part UPDATE 2022-05
// 0 !LICENSE Licensed under CC BY 2.0 and CC BY 4.0 : see CAreadme.txt
// 
// 0 BFC CERTIFY CCW
  [0,"BFC","CERTIFY"],
  [0,"BFC","CCW"],
// 
// 0 !KEYWORDS Repair, Set 6363
// 
// 0 !HISTORY 2022-09-15 [PTadmin] Official Update 2022-05
// 
// 
// 1 16 0 -0.25 0 45 0 0 0 0.25 0 0 0 11 box5-12.dat
  [1,16,0,-0.25,0,45,0,0,0,0.25,0,0,0,11, ldraw_lib__box5_12(realsolid)],
// 1 0 -24 -0.25 0 0 0 -1 0 1 0 1 0 0 2-4chrd.dat
  [1,0,-24,-0.25,0,0,0,-1,0,1,0,1,0,0, ldraw_lib__2_4chrd(realsolid)],
// 1 0 13 -0.25 0 0 0 1 0 1 0 -1 0 0 2-4chrd.dat
  [1,0,13,-0.25,0,0,0,1,0,1,0,-1,0,0, ldraw_lib__2_4chrd(realsolid)],
// 1 14 -24 -0.25 0 0 0 -1 0 1 0 1 0 0 2-4ring1.dat
  [1,14,-24,-0.25,0,0,0,-1,0,1,0,1,0,0, ldraw_lib__2_4ring1(realsolid)],
// 1 14 13 -0.25 0 0 0 1 0 1 0 -1 0 0 2-4ring1.dat
  [1,14,13,-0.25,0,0,0,1,0,1,0,-1,0,0, ldraw_lib__2_4ring1(realsolid)],
// 1 0 -24 -0.25 0 0 0 -2 0 1 0 2 0 0 2-4ring1.dat
  [1,0,-24,-0.25,0,0,0,-2,0,1,0,2,0,0, ldraw_lib__2_4ring1(realsolid)],
// 1 0 13 -0.25 0 0 0 2 0 1 0 -2 0 0 2-4ndis.dat
  [1,0,13,-0.25,0,0,0,2,0,1,0,-2,0,0, ldraw_lib__2_4ndis(realsolid)],
// 1 14 -24 -0.25 0 0 0 -4 0 1 0 4 0 0 2-4ndis.dat
  [1,14,-24,-0.25,0,0,0,-4,0,1,0,4,0,0, ldraw_lib__2_4ndis(realsolid)],
// 4 0 13 -0.25 1 -24 -0.25 1 -24 -0.25 -1 13 -0.25 -1
  [4,0,13,-0.25,1,-24,-0.25,1,-24,-0.25,-1,13,-0.25,-1],
// 4 14 13 -0.25 2 -24 -0.25 2 -24 -0.25 1 13 -0.25 1
  [4,14,13,-0.25,2,-24,-0.25,2,-24,-0.25,1,13,-0.25,1],
// 4 14 13 -0.25 -1 -24 -0.25 -1 -24 -0.25 -2 13 -0.25 -2
  [4,14,13,-0.25,-1,-24,-0.25,-1,-24,-0.25,-2,13,-0.25,-2],
// 4 0 -24 -0.25 4 -24 -0.25 2 13 -0.25 2 15.5 -0.25 4
  [4,0,-24,-0.25,4,-24,-0.25,2,13,-0.25,2,15.5,-0.25,4],
// 3 0 15.5 -0.25 4 13 -0.25 2 15 -0.25 2
  [3,0,15.5,-0.25,4,13,-0.25,2,15,-0.25,2],
// 4 0 15.5 -0.25 4 15 -0.25 2 22.5 -0.25 2 17.6 -0.25 6.1
  [4,0,15.5,-0.25,4,15,-0.25,2,22.5,-0.25,2,17.6,-0.25,6.1],
// 4 0 17.6 -0.25 6.1 22.5 -0.25 2 23.6 -0.25 3.1 20 -0.25 7.7
  [4,0,17.6,-0.25,6.1,22.5,-0.25,2,23.6,-0.25,3.1,20,-0.25,7.7],
// 4 0 22.3 -0.25 8.8 20 -0.25 7.7 23.6 -0.25 3.1 25 -0.25 3.3
  [4,0,22.3,-0.25,8.8,20,-0.25,7.7,23.6,-0.25,3.1,25,-0.25,3.3],
// 4 0 24.8 -0.25 9 22.3 -0.25 8.8 25 -0.25 3.3 27.7 -0.25 7.4
  [4,0,24.8,-0.25,9,22.3,-0.25,8.8,25,-0.25,3.3,27.7,-0.25,7.4],
// 4 0 30.1 -0.25 5.5 25 -0.25 3.3 30 -0.25 2.2 30.8 -0.25 4.7
  [4,0,30.1,-0.25,5.5,25,-0.25,3.3,30,-0.25,2.2,30.8,-0.25,4.7],
// 3 0 30.8 -0.25 4.7 30 -0.25 2.2 30.8 -0.25 3.1
  [3,0,30.8,-0.25,4.7,30,-0.25,2.2,30.8,-0.25,3.1],
// 4 0 22.5 -0.25 2 15 -0.25 2 15 -0.25 0 21.8 -0.25 -0.9
  [4,0,22.5,-0.25,2,15,-0.25,2,15,-0.25,0,21.8,-0.25,-0.9],
// 4 0 21.8 -0.25 -0.9 15 -0.25 0 15 -0.25 -2 22 -0.25 -2.7
  [4,0,21.8,-0.25,-0.9,15,-0.25,0,15,-0.25,-2,22,-0.25,-2.7],
// 4 0 22 -0.25 -2.7 15 -0.25 -2 12.9 -0.25 -4 15.9 -0.25 -6.4
  [4,0,22,-0.25,-2.7,15,-0.25,-2,12.9,-0.25,-4,15.9,-0.25,-6.4],
// 4 0 23 -0.25 -4 22 -0.25 -2.7 15.9 -0.25 -6.4 19.7 -0.25 -8.3
  [4,0,23,-0.25,-4,22,-0.25,-2.7,15.9,-0.25,-6.4,19.7,-0.25,-8.3],
// 4 0 28 -0.25 -5.5 23 -0.25 -4 19.7 -0.25 -8.3 22.3 -0.25 -9
  [4,0,28,-0.25,-5.5,23,-0.25,-4,19.7,-0.25,-8.3,22.3,-0.25,-9],
// 4 0 28 -0.25 -5.5 22.3 -0.25 -9 25.8 -0.25 -8.6 28.6 -0.25 -6.3
  [4,0,28,-0.25,-5.5,22.3,-0.25,-9,25.8,-0.25,-8.6,28.6,-0.25,-6.3],
// 3 0 28.6 -0.25 -6.3 25.8 -0.25 -8.6 28.4 -0.25 -7.4
  [3,0,28.6,-0.25,-6.3,25.8,-0.25,-8.6,28.4,-0.25,-7.4],
// 4 0 13 -0.25 -2 -24 -0.25 -2 -24 -0.25 -4 12.9 -0.25 -4
  [4,0,13,-0.25,-2,-24,-0.25,-2,-24,-0.25,-4,12.9,-0.25,-4],
// 3 0 15 -0.25 -2 13 -0.25 -2 12.9 -0.25 -4
  [3,0,15,-0.25,-2,13,-0.25,-2,12.9,-0.25,-4],
// 3 14 -45 -0.25 11 20 -0.25 7.7 22.3 -0.25 8.8
  [3,14,-45,-0.25,11,20,-0.25,7.7,22.3,-0.25,8.8],
// 3 14 -45 -0.25 11 17.6 -0.25 6.1 20 -0.25 7.7
  [3,14,-45,-0.25,11,17.6,-0.25,6.1,20,-0.25,7.7],
// 4 14 15.5 -0.25 4 17.6 -0.25 6.1 -45 -0.25 11 -24 -0.25 4
  [4,14,15.5,-0.25,4,17.6,-0.25,6.1,-45,-0.25,11,-24,-0.25,4],
// 3 14 -45 -0.25 11 -28 -0.25 4 -24 -0.25 4
  [3,14,-45,-0.25,11,-28,-0.25,4,-24,-0.25,4],
// 4 14 -28 -0.25 0 -28 -0.25 4 -45 -0.25 11 -45 -0.25 -11
  [4,14,-28,-0.25,0,-28,-0.25,4,-45,-0.25,11,-45,-0.25,-11],
// 3 14 -28 -0.25 0 -45 -0.25 -11 -28 -0.25 -4
  [3,14,-28,-0.25,0,-45,-0.25,-11,-28,-0.25,-4],
// 3 14 -24 -0.25 -4 -28 -0.25 -4 -45 -0.25 -11
  [3,14,-24,-0.25,-4,-28,-0.25,-4,-45,-0.25,-11],
// 4 14 12.9 -0.25 -4 -24 -0.25 -4 -45 -0.25 -11 15.9 -0.25 -6.4
  [4,14,12.9,-0.25,-4,-24,-0.25,-4,-45,-0.25,-11,15.9,-0.25,-6.4],
// 3 14 15.9 -0.25 -6.4 -45 -0.25 -11 19.7 -0.25 -8.3
  [3,14,15.9,-0.25,-6.4,-45,-0.25,-11,19.7,-0.25,-8.3],
// 3 14 19.7 -0.25 -8.3 -45 -0.25 -11 22.3 -0.25 -9
  [3,14,19.7,-0.25,-8.3,-45,-0.25,-11,22.3,-0.25,-9],
// 3 14 22.3 -0.25 -9 -45 -0.25 -11 45 -0.25 -11
  [3,14,22.3,-0.25,-9,-45,-0.25,-11,45,-0.25,-11],
// 3 14 25.8 -0.25 -8.6 22.3 -0.25 -9 45 -0.25 -11
  [3,14,25.8,-0.25,-8.6,22.3,-0.25,-9,45,-0.25,-11],
// 3 14 28.4 -0.25 -7.4 25.8 -0.25 -8.6 45 -0.25 -11
  [3,14,28.4,-0.25,-7.4,25.8,-0.25,-8.6,45,-0.25,-11],
// 3 14 28.6 -0.25 -6.3 28.4 -0.25 -7.4 45 -0.25 -11
  [3,14,28.6,-0.25,-6.3,28.4,-0.25,-7.4,45,-0.25,-11],
// 4 14 28.6 -0.25 -6.3 45 -0.25 -11 30 -0.25 2.2 28 -0.25 -5.5
  [4,14,28.6,-0.25,-6.3,45,-0.25,-11,30,-0.25,2.2,28,-0.25,-5.5],
// 4 14 23 -0.25 -4 28 -0.25 -5.5 30 -0.25 2.2 25 -0.25 3.3
  [4,14,23,-0.25,-4,28,-0.25,-5.5,30,-0.25,2.2,25,-0.25,3.3],
// 4 14 22 -0.25 -2.7 23 -0.25 -4 25 -0.25 3.3 23.6 -0.25 3.1
  [4,14,22,-0.25,-2.7,23,-0.25,-4,25,-0.25,3.3,23.6,-0.25,3.1],
// 4 14 21.8 -0.25 -0.9 22 -0.25 -2.7 23.6 -0.25 3.1 22.5 -0.25 2
  [4,14,21.8,-0.25,-0.9,22,-0.25,-2.7,23.6,-0.25,3.1,22.5,-0.25,2],
// 4 14 30.8 -0.25 3.1 30 -0.25 2.2 45 -0.25 -11 45 -0.25 11
  [4,14,30.8,-0.25,3.1,30,-0.25,2.2,45,-0.25,-11,45,-0.25,11],
// 3 14 45 -0.25 11 30.8 -0.25 4.7 30.8 -0.25 3.1
  [3,14,45,-0.25,11,30.8,-0.25,4.7,30.8,-0.25,3.1],
// 3 14 45 -0.25 11 30.1 -0.25 5.5 30.8 -0.25 4.7
  [3,14,45,-0.25,11,30.1,-0.25,5.5,30.8,-0.25,4.7],
// 3 0 27.7 -0.25 7.4 25 -0.25 3.3 30.1 -0.25 5.5
  [3,0,27.7,-0.25,7.4,25,-0.25,3.3,30.1,-0.25,5.5],
// 4 14 24.8 -0.25 9 45 -0.25 11 -45 -0.25 11 22.3 -0.25 8.8
  [4,14,24.8,-0.25,9,45,-0.25,11,-45,-0.25,11,22.3,-0.25,8.8],
// 3 14 45 -0.25 11 24.8 -0.25 9 27.7 -0.25 7.4
  [3,14,45,-0.25,11,24.8,-0.25,9,27.7,-0.25,7.4],
// 3 14 45 -0.25 11 27.7 -0.25 7.4 30.1 -0.25 5.5
  [3,14,45,-0.25,11,27.7,-0.25,7.4,30.1,-0.25,5.5],
];
module ldraw_lib__191815b(step=0, col=false, unit=2/5, alt=false, line=0.2, solid=!$preview)
    makepoly(ldraw_lib__191815b(solid), step=step, col=col, unit=unit, alt=alt, line=line, solid=solid);
ldraw_lib__191815b(line=0.2);
